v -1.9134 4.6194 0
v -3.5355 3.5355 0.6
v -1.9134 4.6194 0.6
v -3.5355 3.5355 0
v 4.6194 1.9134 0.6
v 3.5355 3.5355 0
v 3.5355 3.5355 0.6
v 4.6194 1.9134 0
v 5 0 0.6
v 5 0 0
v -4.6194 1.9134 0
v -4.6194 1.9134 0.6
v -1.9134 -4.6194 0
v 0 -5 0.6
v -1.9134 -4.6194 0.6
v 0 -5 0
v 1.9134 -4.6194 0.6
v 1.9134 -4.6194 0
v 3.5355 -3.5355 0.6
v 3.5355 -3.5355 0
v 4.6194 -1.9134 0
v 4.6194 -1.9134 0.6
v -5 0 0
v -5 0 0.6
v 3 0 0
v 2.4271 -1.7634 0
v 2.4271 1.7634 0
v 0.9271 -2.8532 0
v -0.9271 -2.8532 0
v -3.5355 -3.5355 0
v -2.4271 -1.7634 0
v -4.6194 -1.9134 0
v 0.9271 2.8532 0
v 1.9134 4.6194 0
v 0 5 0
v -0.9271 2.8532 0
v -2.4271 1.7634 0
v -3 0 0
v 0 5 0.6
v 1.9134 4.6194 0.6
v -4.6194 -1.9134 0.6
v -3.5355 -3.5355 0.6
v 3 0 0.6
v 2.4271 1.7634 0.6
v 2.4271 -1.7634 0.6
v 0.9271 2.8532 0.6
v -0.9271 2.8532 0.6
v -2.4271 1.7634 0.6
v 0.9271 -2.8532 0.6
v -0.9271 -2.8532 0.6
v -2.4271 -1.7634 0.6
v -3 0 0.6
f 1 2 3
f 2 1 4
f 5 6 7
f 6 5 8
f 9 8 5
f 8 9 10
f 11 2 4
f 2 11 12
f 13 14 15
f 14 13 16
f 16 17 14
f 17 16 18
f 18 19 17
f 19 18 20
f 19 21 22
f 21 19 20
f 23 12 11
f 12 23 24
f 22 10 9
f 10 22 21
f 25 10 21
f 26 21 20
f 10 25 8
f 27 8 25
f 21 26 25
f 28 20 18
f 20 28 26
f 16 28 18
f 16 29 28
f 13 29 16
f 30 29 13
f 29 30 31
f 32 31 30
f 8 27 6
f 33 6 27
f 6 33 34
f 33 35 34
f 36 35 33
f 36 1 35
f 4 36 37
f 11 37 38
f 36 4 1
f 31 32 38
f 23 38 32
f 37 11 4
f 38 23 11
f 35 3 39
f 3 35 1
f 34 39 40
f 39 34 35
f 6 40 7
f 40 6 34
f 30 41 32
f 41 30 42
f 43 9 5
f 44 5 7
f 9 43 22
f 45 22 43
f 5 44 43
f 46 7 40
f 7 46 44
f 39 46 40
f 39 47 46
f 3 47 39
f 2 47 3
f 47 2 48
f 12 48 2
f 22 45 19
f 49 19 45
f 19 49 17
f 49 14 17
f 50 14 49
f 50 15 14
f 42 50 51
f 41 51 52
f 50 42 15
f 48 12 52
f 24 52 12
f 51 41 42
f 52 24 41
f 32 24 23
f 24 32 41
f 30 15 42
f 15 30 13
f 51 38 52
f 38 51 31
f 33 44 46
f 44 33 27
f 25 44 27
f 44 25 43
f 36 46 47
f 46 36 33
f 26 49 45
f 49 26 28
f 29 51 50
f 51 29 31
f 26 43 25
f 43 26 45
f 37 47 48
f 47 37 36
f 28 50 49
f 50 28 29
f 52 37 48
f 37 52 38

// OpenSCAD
difference() {
  
cylinder(d=10, h=0.6);
  
  translate([0, 0, -1]) cylinder(d=6, h=3);
}
